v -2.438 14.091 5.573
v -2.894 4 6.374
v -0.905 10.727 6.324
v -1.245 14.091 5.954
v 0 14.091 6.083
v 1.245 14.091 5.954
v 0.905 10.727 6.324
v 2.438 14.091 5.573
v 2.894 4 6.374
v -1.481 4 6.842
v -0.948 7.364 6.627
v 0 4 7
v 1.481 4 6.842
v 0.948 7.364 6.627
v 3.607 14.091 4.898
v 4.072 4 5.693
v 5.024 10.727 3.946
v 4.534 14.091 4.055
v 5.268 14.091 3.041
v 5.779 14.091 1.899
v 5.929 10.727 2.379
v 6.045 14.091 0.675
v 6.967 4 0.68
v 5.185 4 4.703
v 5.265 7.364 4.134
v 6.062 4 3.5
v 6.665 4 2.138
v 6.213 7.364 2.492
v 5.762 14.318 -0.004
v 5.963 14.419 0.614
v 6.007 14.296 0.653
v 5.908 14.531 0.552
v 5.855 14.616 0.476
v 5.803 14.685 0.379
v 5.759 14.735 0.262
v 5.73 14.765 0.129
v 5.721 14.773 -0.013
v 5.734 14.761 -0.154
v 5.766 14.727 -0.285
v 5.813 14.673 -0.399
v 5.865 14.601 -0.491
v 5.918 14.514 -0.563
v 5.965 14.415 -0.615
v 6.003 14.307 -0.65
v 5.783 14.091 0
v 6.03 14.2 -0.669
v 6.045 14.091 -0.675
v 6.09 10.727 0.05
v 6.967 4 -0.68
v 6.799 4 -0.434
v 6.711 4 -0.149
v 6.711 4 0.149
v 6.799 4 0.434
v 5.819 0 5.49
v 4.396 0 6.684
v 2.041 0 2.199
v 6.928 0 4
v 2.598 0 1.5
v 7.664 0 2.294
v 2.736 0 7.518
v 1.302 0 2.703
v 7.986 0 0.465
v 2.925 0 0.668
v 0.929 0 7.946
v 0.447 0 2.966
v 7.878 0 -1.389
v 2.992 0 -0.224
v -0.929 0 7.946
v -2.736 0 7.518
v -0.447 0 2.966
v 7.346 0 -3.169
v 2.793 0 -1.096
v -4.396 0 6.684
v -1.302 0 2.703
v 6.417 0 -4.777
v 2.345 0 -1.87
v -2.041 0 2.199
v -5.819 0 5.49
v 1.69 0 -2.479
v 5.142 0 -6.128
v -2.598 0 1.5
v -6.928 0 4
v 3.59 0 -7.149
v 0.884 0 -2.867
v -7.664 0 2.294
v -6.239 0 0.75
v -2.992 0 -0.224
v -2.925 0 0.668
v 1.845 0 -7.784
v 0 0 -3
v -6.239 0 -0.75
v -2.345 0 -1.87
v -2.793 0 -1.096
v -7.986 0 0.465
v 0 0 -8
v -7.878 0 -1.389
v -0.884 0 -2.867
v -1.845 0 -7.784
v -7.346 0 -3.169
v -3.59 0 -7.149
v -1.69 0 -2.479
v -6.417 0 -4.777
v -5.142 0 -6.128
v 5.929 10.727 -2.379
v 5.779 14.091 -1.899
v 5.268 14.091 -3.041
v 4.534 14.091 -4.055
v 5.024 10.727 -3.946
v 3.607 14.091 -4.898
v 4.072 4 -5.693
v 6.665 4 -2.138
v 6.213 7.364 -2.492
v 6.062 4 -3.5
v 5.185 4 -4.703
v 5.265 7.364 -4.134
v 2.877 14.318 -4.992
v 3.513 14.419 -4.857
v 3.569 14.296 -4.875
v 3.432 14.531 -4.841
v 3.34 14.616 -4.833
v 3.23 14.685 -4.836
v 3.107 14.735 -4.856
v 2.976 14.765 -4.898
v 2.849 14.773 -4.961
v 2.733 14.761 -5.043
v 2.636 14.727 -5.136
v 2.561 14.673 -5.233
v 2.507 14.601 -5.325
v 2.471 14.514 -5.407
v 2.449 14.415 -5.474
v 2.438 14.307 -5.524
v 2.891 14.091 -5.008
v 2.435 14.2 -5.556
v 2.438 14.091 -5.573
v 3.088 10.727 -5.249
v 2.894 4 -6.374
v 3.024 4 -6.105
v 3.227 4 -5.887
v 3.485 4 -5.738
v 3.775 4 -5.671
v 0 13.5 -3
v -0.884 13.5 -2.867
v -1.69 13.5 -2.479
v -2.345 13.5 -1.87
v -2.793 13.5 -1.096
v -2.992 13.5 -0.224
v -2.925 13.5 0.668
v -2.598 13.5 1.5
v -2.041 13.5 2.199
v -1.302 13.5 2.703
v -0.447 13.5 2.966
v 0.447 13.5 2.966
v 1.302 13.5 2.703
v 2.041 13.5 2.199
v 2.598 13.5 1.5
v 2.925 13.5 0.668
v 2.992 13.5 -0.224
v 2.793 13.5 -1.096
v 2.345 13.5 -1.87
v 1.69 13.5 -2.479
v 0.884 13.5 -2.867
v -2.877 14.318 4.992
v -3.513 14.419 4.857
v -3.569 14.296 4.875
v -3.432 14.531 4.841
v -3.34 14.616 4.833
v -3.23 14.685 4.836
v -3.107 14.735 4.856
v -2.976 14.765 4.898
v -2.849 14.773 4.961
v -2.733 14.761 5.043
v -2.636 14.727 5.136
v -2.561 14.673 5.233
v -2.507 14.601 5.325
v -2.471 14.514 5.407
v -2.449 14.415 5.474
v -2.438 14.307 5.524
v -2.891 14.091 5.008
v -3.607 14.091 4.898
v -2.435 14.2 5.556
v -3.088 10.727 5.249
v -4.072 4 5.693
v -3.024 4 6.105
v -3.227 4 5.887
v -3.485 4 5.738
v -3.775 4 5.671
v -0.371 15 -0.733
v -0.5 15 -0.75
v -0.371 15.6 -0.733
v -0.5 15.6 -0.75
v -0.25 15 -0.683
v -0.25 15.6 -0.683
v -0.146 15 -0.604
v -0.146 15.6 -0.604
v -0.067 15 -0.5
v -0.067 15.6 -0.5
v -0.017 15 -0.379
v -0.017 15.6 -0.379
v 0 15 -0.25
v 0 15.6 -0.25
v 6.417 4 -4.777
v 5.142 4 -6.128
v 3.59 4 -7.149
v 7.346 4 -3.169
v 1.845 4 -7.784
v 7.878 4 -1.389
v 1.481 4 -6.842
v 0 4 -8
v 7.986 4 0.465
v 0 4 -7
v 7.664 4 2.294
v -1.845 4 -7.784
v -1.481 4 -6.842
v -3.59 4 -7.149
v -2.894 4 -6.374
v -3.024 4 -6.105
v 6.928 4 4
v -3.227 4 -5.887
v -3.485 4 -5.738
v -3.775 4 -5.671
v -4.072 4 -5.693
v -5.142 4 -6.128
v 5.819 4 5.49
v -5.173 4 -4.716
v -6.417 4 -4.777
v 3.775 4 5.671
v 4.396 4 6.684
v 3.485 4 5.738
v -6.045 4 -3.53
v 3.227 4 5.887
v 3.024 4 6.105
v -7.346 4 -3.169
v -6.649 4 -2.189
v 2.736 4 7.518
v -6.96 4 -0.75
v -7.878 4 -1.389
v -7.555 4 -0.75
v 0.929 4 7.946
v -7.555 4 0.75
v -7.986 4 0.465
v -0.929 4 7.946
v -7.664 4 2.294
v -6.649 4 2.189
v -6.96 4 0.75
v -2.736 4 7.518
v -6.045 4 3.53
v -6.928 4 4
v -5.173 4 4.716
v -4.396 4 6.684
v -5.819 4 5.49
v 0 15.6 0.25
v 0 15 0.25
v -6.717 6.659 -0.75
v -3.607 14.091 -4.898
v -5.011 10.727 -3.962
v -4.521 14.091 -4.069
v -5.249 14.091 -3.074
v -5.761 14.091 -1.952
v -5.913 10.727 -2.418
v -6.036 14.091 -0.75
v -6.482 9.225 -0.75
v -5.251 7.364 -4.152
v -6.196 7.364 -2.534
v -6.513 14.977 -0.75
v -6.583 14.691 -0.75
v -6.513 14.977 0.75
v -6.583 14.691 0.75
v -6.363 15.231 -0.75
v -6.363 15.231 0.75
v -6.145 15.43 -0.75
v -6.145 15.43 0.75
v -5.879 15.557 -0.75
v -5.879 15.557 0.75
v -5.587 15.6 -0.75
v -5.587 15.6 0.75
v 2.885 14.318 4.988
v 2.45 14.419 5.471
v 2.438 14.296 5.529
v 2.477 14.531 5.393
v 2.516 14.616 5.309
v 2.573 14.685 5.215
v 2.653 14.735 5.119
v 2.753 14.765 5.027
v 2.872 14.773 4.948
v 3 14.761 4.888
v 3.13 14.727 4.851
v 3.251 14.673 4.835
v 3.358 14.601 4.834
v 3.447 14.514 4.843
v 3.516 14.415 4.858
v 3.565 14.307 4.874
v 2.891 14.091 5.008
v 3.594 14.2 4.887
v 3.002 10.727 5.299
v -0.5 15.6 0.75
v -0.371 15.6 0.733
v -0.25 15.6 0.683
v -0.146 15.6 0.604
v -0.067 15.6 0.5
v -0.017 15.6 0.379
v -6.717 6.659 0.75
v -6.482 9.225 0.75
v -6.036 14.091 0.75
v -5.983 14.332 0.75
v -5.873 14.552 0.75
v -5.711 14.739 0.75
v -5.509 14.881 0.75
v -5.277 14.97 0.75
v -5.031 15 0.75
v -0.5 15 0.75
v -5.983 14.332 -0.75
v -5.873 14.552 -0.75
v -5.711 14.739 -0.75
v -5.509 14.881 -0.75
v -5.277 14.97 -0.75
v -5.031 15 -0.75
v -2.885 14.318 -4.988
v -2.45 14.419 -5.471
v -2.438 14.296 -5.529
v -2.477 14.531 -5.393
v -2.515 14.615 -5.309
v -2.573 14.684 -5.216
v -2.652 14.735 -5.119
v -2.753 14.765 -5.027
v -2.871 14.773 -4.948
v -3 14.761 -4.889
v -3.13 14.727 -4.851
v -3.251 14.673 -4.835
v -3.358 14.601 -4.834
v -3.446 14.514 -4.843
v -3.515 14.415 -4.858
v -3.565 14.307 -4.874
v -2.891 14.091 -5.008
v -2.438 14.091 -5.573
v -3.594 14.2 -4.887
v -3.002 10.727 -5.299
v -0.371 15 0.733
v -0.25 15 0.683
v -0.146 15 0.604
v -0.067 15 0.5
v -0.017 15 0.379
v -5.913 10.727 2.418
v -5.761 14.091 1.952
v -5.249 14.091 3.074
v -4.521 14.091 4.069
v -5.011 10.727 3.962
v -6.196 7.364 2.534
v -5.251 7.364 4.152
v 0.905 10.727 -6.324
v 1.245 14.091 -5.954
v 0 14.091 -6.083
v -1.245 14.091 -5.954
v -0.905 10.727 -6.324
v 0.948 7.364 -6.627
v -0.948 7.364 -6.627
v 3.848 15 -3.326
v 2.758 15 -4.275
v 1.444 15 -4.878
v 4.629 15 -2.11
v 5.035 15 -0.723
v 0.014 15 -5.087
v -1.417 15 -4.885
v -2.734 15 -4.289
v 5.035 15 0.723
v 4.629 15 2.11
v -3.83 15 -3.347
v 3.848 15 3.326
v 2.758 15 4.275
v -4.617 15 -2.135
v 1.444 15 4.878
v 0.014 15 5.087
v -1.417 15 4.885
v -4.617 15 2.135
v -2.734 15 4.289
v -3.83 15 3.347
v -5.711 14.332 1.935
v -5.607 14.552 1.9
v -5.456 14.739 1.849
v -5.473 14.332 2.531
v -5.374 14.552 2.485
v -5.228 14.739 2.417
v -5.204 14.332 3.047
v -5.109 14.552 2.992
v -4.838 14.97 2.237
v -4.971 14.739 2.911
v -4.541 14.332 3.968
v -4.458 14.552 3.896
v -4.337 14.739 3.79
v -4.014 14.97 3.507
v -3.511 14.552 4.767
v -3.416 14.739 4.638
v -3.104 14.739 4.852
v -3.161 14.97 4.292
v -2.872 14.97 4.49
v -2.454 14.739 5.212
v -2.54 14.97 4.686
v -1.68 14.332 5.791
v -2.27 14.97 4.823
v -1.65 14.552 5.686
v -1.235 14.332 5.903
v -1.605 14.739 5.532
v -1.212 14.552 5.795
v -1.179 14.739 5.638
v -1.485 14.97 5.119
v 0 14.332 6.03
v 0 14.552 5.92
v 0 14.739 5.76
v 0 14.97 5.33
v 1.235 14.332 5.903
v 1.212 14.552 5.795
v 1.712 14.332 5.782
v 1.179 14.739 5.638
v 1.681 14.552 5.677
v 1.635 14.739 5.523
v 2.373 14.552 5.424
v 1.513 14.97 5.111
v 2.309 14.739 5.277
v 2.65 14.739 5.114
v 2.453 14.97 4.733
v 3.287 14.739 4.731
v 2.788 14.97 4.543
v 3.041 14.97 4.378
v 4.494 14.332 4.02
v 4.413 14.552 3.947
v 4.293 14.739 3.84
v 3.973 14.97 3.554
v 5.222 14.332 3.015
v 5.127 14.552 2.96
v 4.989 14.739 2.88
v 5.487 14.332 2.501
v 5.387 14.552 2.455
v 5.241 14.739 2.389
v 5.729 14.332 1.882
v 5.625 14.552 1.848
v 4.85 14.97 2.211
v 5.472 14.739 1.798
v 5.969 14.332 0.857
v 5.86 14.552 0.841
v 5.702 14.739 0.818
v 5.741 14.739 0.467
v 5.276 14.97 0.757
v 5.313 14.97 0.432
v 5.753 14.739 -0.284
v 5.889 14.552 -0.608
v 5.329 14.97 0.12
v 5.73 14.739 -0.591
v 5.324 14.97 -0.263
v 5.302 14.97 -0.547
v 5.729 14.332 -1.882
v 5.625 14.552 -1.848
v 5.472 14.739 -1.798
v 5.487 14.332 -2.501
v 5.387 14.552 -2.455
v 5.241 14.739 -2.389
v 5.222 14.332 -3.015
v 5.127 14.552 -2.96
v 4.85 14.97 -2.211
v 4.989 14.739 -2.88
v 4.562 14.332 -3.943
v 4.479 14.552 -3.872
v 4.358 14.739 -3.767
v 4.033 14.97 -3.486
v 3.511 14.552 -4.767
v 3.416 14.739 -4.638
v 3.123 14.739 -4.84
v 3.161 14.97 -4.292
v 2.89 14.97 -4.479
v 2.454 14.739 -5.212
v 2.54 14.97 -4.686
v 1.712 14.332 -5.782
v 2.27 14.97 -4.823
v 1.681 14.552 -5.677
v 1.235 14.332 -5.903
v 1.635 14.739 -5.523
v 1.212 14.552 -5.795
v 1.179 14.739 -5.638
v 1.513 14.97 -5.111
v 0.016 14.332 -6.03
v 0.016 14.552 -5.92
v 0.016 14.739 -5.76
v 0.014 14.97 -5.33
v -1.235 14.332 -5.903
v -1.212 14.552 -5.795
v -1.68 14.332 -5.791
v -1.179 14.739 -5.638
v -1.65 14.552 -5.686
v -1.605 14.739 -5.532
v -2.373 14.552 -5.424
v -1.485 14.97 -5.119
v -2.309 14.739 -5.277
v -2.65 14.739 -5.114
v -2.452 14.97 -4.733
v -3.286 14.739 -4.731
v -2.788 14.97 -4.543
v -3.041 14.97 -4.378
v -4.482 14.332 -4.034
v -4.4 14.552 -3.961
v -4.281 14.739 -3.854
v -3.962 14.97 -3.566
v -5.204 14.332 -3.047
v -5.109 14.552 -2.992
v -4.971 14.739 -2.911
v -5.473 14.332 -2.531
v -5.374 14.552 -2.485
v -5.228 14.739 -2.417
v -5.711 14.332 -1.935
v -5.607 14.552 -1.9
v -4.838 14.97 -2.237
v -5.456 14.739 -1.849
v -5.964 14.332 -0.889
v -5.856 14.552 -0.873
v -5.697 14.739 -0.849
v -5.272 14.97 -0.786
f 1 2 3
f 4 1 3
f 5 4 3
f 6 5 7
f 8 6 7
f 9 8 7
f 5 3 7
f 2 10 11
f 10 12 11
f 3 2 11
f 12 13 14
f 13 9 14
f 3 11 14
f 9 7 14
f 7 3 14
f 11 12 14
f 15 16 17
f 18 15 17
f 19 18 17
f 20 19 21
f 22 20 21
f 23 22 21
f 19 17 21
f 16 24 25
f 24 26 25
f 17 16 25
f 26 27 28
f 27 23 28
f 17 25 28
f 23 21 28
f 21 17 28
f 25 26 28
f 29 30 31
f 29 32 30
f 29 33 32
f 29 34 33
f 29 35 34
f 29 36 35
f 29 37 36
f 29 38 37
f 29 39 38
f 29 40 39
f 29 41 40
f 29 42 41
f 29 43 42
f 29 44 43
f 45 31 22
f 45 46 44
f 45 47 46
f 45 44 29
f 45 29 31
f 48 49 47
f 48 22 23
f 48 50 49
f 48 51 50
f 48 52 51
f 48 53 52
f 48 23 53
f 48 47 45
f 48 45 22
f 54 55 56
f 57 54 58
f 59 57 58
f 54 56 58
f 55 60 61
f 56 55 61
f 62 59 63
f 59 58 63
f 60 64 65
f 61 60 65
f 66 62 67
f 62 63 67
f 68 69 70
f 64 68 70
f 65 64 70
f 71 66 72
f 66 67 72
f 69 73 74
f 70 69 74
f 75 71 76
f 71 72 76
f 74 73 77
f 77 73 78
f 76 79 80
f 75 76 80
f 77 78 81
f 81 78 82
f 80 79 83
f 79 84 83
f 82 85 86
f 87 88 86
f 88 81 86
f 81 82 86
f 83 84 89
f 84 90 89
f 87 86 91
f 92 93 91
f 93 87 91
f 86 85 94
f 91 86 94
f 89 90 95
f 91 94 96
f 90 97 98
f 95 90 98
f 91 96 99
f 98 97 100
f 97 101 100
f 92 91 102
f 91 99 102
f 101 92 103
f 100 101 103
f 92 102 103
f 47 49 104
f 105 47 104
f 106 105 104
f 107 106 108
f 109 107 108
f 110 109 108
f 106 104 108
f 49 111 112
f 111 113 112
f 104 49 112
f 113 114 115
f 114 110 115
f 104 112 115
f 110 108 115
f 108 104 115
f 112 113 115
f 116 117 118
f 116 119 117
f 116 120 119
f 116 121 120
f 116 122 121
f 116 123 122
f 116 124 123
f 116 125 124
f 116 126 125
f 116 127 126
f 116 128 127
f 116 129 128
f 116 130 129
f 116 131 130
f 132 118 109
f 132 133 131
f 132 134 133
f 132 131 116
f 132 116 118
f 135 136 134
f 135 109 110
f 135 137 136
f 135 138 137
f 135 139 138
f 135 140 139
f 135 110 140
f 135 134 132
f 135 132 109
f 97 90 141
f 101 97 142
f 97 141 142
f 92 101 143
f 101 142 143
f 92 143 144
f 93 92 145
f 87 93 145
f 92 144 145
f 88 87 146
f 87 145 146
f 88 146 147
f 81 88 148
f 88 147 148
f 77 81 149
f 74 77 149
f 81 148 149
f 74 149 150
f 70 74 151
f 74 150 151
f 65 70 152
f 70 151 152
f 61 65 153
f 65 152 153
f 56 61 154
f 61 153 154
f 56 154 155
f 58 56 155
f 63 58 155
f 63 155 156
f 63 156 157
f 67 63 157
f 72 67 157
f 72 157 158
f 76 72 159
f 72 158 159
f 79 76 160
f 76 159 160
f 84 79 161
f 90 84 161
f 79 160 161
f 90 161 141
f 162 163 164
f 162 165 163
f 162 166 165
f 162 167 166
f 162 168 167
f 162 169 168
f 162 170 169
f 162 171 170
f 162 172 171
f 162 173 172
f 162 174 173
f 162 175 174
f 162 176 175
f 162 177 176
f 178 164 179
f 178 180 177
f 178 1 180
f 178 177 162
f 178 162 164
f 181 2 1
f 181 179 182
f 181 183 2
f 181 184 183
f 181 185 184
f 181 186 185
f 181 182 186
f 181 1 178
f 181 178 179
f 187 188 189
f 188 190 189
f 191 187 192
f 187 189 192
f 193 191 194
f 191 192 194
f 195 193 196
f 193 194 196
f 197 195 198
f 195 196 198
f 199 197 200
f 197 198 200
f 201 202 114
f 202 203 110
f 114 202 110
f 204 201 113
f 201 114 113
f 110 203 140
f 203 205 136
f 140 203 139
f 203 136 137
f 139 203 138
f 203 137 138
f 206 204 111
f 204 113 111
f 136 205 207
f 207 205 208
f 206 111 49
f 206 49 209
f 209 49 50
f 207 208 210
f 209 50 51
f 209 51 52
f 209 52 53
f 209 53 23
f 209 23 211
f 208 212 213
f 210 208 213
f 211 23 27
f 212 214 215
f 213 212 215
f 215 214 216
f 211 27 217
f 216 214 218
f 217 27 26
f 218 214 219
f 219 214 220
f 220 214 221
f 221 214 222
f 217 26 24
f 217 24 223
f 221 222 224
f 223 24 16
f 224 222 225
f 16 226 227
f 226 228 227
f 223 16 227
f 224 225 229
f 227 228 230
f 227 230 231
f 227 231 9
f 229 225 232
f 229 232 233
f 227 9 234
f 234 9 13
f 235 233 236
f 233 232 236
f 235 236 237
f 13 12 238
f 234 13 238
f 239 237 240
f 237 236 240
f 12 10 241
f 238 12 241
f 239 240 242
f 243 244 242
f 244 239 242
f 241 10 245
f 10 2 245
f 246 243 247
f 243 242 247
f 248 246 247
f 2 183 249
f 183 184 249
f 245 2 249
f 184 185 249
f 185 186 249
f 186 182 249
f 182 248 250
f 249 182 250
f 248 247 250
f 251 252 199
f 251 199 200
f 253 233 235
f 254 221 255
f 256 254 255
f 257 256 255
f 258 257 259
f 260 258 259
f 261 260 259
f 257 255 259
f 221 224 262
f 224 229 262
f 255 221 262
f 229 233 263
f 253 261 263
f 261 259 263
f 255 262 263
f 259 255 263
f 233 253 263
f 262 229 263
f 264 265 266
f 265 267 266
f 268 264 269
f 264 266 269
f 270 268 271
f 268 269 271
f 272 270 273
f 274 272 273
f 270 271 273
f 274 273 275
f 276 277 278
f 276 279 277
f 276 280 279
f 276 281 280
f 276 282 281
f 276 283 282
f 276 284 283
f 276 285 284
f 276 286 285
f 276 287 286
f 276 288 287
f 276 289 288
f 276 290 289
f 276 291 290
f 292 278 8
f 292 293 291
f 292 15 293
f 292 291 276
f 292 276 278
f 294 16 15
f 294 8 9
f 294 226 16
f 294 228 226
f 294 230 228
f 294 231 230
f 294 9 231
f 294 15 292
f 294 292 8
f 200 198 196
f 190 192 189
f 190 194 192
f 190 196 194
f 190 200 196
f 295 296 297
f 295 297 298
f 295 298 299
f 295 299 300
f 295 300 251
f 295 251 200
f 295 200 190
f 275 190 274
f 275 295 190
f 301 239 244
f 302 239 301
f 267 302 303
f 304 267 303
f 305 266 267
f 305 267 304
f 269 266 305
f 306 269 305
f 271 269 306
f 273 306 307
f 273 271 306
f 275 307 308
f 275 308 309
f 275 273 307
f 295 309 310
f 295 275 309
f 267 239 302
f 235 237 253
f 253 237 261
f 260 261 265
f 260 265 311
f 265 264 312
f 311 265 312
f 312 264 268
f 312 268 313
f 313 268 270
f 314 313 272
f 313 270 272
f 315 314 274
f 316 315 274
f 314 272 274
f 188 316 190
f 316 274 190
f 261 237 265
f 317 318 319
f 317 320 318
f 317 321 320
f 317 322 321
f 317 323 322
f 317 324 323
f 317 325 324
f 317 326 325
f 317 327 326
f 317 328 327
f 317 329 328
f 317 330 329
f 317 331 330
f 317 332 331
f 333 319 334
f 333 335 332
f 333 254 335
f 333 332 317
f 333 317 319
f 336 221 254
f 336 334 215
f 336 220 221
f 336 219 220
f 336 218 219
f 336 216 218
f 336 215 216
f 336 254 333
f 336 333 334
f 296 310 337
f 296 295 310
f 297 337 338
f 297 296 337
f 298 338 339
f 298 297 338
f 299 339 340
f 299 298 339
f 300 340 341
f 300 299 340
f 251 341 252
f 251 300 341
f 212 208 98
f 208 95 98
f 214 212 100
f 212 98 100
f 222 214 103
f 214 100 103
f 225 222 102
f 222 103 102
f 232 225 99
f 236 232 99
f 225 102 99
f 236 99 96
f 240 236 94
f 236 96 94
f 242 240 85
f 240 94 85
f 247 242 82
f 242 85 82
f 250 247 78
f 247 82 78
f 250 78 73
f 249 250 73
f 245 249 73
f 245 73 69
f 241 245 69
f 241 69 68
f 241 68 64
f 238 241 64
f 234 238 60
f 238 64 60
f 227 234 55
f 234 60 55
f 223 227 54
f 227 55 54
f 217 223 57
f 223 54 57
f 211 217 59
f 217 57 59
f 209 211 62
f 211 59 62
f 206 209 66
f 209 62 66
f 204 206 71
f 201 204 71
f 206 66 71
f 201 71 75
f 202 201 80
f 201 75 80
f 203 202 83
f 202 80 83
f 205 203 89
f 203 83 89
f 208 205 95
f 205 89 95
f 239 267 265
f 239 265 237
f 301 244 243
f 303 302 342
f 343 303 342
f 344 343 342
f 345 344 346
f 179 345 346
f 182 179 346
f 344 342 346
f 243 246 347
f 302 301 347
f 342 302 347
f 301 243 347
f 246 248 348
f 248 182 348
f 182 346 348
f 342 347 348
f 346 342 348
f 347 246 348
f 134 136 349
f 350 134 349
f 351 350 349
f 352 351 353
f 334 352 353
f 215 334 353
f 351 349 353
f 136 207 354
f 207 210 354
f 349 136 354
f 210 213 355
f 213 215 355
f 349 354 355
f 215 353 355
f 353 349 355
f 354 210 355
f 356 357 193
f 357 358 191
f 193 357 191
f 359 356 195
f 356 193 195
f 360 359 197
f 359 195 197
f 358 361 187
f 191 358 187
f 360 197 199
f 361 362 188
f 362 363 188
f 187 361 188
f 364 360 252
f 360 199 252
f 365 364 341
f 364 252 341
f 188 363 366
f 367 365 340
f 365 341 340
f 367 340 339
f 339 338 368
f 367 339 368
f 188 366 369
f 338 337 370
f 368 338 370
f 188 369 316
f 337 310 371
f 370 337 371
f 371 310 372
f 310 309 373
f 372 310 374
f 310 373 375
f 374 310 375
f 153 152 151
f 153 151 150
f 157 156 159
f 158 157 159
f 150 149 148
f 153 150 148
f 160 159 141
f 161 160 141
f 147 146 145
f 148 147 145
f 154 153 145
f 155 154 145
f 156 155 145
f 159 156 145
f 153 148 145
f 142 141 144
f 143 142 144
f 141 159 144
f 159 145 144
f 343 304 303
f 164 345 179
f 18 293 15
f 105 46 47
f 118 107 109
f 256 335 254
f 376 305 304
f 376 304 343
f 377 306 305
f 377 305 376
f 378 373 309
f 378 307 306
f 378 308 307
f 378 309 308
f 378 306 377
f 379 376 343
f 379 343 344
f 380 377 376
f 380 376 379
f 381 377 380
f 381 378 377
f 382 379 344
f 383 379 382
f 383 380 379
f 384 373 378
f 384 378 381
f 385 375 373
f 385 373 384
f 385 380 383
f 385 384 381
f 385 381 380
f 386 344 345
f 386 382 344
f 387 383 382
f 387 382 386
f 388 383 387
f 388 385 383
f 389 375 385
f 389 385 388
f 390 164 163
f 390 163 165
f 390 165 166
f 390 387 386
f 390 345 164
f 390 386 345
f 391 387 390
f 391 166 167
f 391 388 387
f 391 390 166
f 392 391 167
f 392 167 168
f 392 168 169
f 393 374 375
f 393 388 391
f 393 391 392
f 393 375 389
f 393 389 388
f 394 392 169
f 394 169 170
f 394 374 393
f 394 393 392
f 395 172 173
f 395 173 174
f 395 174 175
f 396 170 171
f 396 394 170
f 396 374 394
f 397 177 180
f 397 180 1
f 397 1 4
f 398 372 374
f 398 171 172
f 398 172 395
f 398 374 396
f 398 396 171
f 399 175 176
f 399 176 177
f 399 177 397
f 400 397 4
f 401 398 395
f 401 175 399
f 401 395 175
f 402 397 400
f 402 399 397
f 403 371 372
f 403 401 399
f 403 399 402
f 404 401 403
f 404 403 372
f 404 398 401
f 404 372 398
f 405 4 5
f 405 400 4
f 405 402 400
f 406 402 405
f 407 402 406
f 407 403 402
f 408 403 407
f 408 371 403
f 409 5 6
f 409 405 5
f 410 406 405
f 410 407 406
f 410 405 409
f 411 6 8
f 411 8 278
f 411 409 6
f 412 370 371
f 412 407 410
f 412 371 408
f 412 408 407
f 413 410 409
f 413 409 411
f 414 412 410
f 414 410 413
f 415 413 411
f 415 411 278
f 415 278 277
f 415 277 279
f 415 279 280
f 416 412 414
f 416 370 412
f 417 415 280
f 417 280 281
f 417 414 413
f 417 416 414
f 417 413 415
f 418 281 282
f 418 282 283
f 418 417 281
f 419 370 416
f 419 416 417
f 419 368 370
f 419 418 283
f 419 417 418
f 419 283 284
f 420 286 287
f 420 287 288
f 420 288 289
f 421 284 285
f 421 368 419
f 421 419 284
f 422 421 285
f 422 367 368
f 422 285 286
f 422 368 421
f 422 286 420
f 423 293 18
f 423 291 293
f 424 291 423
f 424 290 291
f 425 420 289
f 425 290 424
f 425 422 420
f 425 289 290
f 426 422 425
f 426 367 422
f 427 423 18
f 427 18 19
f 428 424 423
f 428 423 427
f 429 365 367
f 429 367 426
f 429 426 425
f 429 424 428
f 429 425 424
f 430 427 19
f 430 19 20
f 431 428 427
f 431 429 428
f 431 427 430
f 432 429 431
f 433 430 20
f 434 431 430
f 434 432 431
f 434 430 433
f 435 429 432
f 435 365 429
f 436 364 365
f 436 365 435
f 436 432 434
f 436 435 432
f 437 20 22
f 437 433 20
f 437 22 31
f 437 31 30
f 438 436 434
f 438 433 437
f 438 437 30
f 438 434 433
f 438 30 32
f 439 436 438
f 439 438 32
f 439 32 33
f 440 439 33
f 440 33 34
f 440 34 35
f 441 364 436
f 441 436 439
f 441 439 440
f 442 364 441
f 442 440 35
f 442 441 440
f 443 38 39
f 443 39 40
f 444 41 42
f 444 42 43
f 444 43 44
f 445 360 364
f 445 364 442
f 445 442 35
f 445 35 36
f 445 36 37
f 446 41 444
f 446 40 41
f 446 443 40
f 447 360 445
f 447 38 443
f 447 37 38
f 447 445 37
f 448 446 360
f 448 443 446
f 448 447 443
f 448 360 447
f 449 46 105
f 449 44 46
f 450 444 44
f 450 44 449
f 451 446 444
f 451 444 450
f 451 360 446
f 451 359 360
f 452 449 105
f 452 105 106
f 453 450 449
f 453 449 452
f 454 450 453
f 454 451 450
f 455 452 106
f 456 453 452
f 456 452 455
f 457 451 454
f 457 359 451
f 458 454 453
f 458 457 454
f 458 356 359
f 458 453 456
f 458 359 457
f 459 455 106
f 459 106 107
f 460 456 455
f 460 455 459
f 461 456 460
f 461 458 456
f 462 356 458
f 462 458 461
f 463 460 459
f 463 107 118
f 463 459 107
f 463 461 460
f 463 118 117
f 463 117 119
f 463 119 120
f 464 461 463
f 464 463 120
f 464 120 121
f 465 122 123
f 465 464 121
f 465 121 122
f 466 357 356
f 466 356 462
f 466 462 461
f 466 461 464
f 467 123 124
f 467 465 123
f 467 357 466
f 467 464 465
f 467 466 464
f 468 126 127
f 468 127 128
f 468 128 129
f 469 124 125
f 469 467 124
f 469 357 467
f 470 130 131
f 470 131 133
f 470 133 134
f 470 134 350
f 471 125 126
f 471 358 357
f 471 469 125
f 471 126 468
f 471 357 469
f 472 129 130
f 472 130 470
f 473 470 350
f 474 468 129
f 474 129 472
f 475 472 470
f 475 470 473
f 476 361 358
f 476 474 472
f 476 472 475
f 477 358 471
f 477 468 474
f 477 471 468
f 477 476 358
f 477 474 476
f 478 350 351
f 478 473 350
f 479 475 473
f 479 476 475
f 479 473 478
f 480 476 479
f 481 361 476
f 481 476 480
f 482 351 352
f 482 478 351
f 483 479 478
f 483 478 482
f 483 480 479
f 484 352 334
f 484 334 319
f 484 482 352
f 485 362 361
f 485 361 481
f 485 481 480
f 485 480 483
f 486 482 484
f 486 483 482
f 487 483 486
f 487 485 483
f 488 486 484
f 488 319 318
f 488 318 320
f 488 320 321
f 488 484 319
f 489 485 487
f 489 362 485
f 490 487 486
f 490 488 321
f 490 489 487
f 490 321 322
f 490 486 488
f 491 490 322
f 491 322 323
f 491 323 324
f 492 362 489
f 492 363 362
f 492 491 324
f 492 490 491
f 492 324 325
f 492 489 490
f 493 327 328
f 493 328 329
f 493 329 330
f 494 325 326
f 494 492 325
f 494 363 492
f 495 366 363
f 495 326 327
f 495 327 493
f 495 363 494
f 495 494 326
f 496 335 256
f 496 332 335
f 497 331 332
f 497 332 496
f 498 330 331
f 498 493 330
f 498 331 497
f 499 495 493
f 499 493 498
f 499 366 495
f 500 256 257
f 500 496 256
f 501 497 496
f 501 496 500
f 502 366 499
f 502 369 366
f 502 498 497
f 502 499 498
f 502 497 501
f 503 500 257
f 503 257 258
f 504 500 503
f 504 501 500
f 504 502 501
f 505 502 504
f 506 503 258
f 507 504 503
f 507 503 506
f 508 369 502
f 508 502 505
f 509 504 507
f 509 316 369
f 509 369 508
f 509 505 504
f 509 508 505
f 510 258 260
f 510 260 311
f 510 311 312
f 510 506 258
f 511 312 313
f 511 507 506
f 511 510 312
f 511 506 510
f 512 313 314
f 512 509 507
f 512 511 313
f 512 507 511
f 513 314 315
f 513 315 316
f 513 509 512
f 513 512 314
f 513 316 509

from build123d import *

# Parameters (mm, degrees)
BOSS_EXTRU_1_DEPTH           = 0.75
ESQUISSE5_R                  = 1
R_P_TITION_CIRCULAIRE1_COUNT = 6
CONG_1_R                     = 1
CONG_3_R                     = 1
CONG_2_R                     = 0.5


with BuildPart() as part:
    # Esquisse1 → Révolution1 (revolve)
    with BuildSketch(Plane.XY):
        Polygon((0, 13.5), (0, 15), (6, 15), (7, 4), (8, 4), (8, 0), (3, 0), (3, 13.5), align=None)
    revolve(axis=Axis((0, 13.5, 0), (0, 1, 0)))

    # Esquisse2 → Boss.-Extru.1 (add, symmetric)
    with BuildSketch(Plane.XY):
        Polygon((0, 13.844024699), (0, 15.6), (-6.5, 15.6), (-7.917715453, 0.005130014), (-6.239023438, 0), (-4.974172869, 13.844024699), align=None)
    extrude(amount=BOSS_EXTRU_1_DEPTH, both=True)

    # Enlèvement de matière-Balayage1: sweep along a path in Esquisse4
    with BuildLine(Plane.XY) as enl_vement_de_mati_re_balayage1_path:
        Line((6, 15), (7, 4))
    # Esquisse5 → Enlèvement de matière-Balayage1 (sweep, cut)
    with BuildSketch(Plane(origin=(0, 15, 0), x_dir=(1, 0, 0), z_dir=(0, 1, 0))):
        with Locations((6.7, 0)):
            Circle(ESQUISSE5_R)
    enl_vement_de_mati_re_balayage1 = sweep(path=enl_vement_de_mati_re_balayage1_path.line, mode=Mode.SUBTRACT)

    # Répétition circulaire1: Enlèvement de matière-Balayage1 ×6 about axis, 1 skipped
    r_p_tition_circulaire1_axis = Axis((0, 4, 0), (0, -1, 0))
    add([enl_vement_de_mati_re_balayage1.rotate(r_p_tition_circulaire1_axis, i * 360 / R_P_TITION_CIRCULAIRE1_COUNT) for i in range(1, R_P_TITION_CIRCULAIRE1_COUNT) if i not in (3,)], mode=Mode.SUBTRACT)

    # Congé1
    cong_1_edges = [part.edges().sort_by_distance(p)[0] for p in [
        (-5.177098565, 15, 3.03276284),
    ]]
    fillet(cong_1_edges, radius=CONG_1_R)

    # Congé3
    cong_3_edges = [part.edges().sort_by_distance(p)[0] for p in [
        (-6.5, 15.6, 0),
    ]]
    fillet(cong_3_edges, radius=CONG_3_R)

    # Congé2
    cong_2_edges = [part.edges().sort_by_distance(p)[0] for p in [
        (0, 15.3, -0.75),
        (0, 15.3, 0.75),
    ]]
    fillet(cong_2_edges, radius=CONG_2_R)


solid = part.part
